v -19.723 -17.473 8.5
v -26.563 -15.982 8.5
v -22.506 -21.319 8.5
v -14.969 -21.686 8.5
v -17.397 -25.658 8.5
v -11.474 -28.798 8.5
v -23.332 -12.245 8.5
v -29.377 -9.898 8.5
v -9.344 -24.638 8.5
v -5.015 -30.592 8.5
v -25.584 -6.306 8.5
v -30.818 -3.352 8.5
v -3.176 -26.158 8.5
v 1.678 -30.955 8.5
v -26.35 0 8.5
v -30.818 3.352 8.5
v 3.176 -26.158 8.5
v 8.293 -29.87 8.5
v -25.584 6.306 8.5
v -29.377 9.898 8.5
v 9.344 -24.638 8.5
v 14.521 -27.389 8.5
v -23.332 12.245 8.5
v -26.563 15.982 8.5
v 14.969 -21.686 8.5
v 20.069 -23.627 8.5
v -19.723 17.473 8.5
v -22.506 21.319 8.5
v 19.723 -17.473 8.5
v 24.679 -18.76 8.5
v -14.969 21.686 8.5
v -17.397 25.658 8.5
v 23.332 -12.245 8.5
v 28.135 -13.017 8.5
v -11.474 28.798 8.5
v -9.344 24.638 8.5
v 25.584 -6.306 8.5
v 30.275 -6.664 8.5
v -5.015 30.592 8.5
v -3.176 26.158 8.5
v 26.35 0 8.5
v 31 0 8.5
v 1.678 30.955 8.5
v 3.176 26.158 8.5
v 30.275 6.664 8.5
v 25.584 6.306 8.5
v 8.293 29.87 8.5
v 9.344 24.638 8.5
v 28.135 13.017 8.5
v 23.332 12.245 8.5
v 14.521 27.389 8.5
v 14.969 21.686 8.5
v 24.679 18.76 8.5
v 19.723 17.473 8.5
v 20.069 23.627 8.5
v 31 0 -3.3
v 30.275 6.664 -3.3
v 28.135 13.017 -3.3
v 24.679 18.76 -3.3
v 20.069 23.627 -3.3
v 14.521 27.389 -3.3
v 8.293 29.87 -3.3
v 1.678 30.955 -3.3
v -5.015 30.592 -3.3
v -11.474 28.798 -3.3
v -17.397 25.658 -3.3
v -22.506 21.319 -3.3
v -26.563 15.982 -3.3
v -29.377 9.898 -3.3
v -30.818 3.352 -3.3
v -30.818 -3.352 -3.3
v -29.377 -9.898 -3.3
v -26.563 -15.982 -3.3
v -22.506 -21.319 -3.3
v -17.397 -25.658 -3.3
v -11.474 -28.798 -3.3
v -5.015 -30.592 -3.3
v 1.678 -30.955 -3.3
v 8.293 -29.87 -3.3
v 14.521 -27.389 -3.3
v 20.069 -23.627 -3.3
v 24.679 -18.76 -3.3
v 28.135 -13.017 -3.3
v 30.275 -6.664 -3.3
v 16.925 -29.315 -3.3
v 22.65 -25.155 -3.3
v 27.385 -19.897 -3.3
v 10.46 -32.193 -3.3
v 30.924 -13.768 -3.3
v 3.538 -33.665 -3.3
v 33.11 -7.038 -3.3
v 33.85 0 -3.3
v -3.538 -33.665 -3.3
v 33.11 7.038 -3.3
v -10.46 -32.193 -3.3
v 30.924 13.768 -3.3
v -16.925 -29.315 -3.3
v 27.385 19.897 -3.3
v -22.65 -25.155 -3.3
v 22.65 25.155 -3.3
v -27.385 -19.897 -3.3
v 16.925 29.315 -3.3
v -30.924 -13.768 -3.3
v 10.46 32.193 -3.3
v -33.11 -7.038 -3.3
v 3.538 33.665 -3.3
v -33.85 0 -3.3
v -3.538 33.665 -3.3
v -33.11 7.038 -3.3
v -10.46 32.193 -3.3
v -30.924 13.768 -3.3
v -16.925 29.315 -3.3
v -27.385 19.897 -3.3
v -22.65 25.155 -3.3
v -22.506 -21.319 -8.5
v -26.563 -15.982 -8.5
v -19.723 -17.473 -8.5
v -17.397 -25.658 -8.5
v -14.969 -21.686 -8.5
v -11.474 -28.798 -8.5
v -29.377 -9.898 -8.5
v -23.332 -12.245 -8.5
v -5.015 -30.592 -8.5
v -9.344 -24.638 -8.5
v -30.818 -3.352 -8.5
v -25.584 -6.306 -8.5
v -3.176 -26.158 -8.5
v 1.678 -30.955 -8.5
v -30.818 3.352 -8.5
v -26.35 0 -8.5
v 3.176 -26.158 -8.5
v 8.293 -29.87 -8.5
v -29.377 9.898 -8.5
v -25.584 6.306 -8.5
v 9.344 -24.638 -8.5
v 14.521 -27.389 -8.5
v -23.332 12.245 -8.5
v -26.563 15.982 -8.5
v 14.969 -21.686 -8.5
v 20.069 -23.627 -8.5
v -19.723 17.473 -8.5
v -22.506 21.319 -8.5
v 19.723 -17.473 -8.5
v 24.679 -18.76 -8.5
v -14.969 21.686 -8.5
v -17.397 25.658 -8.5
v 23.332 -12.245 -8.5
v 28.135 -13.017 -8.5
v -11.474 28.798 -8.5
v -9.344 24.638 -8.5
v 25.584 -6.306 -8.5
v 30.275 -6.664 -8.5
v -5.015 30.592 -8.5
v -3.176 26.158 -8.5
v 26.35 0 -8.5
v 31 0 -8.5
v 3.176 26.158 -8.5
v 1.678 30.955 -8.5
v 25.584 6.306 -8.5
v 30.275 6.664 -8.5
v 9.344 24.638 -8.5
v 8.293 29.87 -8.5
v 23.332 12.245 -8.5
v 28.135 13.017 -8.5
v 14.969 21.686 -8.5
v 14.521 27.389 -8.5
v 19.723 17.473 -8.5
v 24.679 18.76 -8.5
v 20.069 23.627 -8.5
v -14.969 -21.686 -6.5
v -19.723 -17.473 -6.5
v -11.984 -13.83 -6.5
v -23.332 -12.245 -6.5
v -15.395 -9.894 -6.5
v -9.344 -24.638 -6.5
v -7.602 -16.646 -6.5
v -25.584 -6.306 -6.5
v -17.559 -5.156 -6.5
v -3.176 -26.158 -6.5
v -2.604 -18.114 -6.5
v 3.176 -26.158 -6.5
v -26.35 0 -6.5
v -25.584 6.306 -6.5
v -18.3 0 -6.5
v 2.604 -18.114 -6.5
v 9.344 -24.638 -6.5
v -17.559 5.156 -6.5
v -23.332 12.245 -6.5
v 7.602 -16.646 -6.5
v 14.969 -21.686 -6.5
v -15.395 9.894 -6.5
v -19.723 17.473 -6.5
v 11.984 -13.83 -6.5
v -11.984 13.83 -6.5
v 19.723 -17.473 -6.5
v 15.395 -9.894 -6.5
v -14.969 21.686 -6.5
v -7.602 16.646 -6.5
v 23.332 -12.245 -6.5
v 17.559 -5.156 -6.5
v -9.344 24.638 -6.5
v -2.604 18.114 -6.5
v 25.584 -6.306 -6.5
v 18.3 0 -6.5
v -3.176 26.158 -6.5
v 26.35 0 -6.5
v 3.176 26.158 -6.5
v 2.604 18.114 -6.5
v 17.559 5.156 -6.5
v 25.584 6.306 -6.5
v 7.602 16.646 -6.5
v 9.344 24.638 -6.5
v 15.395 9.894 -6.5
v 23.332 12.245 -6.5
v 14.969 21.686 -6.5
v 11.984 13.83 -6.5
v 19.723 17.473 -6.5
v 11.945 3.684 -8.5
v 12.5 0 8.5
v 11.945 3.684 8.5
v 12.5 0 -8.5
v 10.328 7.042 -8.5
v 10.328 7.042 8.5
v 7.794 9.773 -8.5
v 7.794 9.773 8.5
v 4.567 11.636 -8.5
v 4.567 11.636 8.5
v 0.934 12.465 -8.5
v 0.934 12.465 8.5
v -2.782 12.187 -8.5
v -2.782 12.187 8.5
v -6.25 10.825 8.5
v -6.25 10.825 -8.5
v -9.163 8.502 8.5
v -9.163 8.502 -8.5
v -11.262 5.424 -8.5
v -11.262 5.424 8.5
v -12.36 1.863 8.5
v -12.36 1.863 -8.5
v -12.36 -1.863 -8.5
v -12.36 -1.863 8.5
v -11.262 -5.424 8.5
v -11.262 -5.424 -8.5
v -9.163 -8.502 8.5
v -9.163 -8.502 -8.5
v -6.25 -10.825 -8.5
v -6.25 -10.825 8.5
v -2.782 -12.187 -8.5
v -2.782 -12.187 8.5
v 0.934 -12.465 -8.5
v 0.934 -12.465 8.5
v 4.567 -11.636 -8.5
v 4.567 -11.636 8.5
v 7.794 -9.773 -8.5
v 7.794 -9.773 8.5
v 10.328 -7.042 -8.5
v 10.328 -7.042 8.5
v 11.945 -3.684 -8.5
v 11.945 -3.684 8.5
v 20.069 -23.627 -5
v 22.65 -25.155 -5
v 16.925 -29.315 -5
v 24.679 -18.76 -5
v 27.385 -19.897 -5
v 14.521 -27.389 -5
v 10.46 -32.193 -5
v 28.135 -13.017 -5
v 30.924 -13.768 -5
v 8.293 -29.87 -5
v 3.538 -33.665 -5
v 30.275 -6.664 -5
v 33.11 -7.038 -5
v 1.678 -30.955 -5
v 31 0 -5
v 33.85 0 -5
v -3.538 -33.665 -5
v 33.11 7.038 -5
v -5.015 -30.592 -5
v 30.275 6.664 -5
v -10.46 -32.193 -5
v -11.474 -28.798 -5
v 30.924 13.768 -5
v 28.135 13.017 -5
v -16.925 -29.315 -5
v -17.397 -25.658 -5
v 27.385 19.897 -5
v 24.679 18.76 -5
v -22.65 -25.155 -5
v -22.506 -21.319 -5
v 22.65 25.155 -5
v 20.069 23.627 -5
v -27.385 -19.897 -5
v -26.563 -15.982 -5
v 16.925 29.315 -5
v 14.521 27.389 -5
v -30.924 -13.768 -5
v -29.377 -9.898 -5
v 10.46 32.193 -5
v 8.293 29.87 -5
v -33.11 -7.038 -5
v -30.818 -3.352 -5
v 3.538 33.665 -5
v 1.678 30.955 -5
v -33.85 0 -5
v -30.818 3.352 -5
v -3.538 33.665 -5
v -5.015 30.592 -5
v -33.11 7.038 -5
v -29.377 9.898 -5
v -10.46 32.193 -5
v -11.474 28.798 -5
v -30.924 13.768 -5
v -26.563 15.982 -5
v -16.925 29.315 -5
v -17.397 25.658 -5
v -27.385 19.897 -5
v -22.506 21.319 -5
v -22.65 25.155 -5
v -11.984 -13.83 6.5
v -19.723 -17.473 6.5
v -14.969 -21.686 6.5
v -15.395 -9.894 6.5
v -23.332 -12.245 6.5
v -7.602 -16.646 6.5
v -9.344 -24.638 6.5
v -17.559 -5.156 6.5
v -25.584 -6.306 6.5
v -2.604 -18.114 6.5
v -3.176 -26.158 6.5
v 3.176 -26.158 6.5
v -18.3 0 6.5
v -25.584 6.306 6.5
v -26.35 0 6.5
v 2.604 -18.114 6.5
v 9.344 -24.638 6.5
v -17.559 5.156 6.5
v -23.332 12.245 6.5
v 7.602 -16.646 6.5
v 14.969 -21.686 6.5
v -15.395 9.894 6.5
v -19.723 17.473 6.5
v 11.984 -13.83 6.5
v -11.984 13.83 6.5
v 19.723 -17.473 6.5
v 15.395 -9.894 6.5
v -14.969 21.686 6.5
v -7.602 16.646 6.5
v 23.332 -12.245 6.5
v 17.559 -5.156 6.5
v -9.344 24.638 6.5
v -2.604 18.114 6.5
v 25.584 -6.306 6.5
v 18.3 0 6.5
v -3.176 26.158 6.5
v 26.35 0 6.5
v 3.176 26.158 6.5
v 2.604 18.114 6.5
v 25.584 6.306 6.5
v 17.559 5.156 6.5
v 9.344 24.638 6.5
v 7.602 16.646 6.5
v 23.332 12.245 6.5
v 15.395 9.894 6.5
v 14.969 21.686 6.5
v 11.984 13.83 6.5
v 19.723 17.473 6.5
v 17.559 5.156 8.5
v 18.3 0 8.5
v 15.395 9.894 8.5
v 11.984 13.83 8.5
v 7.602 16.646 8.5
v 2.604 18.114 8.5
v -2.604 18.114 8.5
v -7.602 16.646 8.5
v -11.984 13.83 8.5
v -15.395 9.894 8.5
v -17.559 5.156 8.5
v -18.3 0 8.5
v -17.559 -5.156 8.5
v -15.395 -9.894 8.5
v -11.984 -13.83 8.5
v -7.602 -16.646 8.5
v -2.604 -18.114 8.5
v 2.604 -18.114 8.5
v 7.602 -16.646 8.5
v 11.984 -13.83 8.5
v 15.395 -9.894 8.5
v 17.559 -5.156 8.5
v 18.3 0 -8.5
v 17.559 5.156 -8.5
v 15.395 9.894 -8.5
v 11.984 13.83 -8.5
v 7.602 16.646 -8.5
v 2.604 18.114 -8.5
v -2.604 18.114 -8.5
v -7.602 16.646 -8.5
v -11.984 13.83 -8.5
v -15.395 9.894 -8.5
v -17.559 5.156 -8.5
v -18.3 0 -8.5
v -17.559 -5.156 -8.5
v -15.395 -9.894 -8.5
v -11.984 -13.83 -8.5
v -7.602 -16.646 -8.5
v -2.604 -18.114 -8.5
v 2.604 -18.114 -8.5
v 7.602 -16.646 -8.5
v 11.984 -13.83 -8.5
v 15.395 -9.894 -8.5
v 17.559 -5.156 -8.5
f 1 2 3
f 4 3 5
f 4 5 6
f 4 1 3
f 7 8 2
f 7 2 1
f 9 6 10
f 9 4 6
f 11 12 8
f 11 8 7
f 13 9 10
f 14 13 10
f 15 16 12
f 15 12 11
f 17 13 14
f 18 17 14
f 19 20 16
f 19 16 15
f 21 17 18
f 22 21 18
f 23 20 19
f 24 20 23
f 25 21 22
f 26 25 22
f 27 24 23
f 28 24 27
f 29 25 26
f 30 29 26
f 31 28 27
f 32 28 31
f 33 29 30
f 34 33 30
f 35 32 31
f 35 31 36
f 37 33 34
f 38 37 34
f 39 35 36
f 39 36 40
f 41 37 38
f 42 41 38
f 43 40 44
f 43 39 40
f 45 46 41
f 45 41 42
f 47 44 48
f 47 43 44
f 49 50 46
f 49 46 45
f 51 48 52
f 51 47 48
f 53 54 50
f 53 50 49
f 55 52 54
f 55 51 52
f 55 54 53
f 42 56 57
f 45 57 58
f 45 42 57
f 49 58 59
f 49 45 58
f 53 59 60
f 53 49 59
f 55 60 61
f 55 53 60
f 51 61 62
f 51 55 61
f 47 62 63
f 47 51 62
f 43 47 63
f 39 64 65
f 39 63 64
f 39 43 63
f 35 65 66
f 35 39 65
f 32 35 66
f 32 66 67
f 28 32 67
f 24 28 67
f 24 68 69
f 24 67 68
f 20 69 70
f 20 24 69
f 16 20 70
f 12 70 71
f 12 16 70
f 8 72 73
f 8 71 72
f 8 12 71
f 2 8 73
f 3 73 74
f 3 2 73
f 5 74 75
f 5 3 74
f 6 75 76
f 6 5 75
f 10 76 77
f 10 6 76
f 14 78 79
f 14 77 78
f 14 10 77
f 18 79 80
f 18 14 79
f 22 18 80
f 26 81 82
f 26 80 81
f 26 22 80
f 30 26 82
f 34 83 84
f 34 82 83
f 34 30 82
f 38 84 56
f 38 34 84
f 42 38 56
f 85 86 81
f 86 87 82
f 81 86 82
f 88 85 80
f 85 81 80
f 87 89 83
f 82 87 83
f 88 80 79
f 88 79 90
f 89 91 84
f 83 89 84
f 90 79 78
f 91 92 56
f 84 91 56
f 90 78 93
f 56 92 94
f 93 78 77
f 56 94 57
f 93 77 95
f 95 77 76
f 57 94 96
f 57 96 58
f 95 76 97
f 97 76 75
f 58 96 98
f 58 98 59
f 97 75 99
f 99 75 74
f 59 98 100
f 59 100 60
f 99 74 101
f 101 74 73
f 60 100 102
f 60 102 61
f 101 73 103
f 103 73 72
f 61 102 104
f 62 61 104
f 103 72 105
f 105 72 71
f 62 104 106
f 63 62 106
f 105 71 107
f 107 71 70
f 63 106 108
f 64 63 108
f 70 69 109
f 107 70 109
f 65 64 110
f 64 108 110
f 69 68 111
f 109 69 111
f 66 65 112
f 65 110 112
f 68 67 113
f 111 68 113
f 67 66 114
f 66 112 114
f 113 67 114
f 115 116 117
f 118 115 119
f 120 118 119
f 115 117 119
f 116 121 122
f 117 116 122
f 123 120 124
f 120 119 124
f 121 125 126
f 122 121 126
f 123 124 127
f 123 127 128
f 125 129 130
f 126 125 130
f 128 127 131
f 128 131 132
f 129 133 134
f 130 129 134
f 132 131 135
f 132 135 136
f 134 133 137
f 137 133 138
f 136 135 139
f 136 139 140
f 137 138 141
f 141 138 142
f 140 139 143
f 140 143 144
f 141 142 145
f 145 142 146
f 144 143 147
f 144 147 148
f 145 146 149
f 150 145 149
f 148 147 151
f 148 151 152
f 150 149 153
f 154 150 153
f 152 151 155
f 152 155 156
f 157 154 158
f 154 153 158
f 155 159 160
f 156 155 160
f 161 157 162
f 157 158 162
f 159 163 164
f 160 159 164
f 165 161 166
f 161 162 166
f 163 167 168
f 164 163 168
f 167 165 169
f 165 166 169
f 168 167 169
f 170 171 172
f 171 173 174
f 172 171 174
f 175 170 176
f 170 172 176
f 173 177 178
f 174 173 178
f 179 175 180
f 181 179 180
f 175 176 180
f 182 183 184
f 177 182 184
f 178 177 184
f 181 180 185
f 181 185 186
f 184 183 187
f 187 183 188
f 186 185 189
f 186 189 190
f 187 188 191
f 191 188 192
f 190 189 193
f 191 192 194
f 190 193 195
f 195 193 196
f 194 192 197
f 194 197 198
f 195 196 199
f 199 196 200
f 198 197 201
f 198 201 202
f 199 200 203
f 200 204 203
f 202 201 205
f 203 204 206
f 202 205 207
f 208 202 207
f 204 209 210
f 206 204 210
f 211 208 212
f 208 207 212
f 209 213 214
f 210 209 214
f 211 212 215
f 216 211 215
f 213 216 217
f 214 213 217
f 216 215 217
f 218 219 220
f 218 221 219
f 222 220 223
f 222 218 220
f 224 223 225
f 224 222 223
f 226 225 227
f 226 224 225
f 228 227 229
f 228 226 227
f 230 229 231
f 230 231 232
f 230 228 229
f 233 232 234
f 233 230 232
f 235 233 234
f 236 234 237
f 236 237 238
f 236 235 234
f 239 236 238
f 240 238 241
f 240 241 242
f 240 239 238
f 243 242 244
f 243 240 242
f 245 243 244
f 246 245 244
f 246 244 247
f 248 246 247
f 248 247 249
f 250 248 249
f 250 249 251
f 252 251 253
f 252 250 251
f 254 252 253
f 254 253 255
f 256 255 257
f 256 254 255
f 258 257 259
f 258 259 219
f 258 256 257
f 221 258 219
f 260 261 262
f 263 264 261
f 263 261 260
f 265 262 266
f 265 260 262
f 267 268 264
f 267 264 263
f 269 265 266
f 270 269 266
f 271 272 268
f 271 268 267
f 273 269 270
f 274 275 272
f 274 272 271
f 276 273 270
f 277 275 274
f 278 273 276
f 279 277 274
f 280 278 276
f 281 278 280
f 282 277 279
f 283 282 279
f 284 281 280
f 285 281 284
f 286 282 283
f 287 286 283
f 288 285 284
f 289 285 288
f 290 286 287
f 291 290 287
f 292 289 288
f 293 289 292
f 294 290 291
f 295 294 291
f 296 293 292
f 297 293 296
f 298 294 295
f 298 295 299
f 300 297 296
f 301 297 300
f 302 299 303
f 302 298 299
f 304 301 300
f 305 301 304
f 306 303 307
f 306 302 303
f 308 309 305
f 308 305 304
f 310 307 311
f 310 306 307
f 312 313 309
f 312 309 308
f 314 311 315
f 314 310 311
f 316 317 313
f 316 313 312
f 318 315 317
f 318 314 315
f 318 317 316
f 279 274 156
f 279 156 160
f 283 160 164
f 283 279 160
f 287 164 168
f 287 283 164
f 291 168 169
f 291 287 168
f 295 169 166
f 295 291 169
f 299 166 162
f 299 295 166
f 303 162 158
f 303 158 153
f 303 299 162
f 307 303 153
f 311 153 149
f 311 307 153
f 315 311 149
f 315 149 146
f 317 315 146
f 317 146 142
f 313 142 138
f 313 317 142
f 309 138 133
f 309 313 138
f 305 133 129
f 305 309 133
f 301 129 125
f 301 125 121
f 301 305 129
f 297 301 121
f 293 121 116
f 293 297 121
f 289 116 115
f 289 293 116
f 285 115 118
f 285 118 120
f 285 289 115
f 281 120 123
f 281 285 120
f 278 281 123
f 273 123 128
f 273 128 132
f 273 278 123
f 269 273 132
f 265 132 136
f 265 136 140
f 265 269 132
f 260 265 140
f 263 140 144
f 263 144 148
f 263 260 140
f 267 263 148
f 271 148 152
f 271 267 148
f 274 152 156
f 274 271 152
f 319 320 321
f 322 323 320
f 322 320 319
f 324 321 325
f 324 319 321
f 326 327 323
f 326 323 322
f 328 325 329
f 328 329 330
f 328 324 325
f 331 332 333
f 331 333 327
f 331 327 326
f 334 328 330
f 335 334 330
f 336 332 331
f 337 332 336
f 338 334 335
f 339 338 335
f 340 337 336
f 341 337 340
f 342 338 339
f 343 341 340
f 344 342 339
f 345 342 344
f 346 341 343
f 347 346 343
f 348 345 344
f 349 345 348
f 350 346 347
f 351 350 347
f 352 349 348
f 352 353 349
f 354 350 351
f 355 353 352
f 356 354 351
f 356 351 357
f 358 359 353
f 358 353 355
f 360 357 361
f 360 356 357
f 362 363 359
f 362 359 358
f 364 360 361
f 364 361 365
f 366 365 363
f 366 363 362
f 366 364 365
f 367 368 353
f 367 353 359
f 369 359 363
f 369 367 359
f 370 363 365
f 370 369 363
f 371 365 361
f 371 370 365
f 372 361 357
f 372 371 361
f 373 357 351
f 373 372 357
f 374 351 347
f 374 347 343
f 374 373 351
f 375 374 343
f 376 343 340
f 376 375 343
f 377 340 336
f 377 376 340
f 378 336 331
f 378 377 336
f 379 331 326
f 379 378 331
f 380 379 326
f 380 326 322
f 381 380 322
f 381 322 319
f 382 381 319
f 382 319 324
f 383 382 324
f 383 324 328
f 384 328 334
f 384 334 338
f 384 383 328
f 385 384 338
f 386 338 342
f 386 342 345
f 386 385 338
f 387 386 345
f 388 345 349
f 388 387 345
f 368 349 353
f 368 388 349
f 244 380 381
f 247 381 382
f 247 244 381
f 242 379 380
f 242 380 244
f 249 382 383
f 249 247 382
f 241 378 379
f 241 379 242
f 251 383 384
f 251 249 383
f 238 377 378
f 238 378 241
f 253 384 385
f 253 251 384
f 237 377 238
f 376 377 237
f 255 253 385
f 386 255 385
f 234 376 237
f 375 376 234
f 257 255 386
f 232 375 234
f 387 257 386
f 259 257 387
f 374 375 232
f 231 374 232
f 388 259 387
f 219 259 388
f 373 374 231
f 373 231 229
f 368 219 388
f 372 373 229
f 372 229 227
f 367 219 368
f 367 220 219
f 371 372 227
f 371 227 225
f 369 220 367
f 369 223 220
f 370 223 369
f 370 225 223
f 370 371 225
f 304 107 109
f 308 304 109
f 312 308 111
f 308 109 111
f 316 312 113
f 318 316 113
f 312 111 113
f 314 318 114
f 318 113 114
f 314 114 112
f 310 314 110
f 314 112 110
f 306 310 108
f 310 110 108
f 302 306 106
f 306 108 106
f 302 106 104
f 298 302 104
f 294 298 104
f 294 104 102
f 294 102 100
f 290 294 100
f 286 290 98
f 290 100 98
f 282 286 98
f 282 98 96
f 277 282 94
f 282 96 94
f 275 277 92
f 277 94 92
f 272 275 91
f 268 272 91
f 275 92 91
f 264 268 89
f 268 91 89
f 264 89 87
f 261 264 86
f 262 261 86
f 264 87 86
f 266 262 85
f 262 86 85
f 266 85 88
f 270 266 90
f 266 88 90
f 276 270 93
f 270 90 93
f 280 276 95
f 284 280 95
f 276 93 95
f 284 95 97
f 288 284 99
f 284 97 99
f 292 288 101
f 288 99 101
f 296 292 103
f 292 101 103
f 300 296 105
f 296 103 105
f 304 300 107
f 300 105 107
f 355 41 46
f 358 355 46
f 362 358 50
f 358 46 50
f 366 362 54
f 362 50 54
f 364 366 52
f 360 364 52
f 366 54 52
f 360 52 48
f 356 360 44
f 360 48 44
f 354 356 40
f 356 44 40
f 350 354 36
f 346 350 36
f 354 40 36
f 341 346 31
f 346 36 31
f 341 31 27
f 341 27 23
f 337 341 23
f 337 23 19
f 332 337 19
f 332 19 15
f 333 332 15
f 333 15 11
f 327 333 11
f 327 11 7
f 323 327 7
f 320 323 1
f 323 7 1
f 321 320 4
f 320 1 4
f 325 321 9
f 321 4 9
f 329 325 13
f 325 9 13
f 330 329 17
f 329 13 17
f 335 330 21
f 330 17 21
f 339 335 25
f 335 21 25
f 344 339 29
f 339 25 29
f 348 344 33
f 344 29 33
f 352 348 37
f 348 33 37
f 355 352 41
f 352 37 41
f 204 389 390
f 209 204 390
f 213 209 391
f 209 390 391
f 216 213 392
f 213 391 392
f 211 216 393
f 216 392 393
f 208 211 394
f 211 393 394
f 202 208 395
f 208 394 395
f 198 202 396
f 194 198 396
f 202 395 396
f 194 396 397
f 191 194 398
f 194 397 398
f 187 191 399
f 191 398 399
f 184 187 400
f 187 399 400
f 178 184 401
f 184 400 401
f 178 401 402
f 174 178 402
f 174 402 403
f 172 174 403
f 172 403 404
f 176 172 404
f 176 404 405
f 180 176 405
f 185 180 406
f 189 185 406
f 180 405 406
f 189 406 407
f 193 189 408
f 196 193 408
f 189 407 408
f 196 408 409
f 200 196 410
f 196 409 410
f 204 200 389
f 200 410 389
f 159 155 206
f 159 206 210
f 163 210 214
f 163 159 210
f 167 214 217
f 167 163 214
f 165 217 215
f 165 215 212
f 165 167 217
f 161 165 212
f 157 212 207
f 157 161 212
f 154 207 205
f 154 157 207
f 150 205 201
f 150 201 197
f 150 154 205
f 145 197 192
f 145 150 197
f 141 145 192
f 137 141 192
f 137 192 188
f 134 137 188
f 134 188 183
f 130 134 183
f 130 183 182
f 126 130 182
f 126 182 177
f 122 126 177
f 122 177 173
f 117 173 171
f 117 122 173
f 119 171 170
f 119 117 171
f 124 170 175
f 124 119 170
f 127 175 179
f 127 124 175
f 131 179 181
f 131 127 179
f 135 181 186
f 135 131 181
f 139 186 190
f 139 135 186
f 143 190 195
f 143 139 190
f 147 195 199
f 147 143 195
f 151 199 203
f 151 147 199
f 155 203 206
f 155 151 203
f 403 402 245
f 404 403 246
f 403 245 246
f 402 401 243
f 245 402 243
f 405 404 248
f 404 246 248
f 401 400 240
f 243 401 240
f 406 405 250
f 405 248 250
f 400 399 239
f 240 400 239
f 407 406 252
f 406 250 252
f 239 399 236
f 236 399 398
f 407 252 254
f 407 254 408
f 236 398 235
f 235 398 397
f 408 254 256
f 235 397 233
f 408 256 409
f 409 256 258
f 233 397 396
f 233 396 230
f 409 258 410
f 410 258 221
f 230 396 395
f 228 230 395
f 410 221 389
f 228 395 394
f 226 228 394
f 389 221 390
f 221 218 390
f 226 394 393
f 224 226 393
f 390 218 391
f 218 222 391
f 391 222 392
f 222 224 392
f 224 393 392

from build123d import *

# Parameters (mm, degrees)
SKETCH1_R           = 31
SKETCH1_R_2         = 12.5
BOSS_EXTRUDE1_DEPTH = 8.5
SKETCH3_R           = 26.35
SKETCH3_R_2         = 18.3
CUT_EXTRUDE1_DEPTH  = 2
BOSS_EXTRUDE2_START = -1.7
SKETCH4_R           = 33.85
SKETCH4_R_2         = 31
BOSS_EXTRUDE2_DEPTH = 1.7


with BuildPart() as part:
    # Sketch1 → Boss-Extrude1 (new, symmetric)
    with BuildSketch(Plane.XY):
        Circle(SKETCH1_R)
        Circle(SKETCH1_R_2, mode=Mode.SUBTRACT)
    extrude(amount=BOSS_EXTRUDE1_DEPTH, both=True)

    # Sketch3 → Cut-Extrude1 (cut)
    with BuildSketch(Plane.XY.offset(8.5)):
        Circle(SKETCH3_R)
        Circle(SKETCH3_R_2, mode=Mode.SUBTRACT)
    cut_extrude1 = extrude(amount=-CUT_EXTRUDE1_DEPTH, mode=Mode.SUBTRACT)

    # Mirror1: Cut-Extrude1 across plane
    add(cut_extrude1.mirror(Plane.XY), mode=Mode.SUBTRACT)

    # Sketch4 → Boss-Extrude2 (add)
    with BuildSketch(Plane(origin=(0, 0, -5), x_dir=(-1, 0, 0), z_dir=(0, 0, -1)).offset(BOSS_EXTRUDE2_START)):
        Circle(SKETCH4_R)
        Circle(SKETCH4_R_2, mode=Mode.SUBTRACT)
    extrude(amount=BOSS_EXTRUDE2_DEPTH)


solid = part.part
